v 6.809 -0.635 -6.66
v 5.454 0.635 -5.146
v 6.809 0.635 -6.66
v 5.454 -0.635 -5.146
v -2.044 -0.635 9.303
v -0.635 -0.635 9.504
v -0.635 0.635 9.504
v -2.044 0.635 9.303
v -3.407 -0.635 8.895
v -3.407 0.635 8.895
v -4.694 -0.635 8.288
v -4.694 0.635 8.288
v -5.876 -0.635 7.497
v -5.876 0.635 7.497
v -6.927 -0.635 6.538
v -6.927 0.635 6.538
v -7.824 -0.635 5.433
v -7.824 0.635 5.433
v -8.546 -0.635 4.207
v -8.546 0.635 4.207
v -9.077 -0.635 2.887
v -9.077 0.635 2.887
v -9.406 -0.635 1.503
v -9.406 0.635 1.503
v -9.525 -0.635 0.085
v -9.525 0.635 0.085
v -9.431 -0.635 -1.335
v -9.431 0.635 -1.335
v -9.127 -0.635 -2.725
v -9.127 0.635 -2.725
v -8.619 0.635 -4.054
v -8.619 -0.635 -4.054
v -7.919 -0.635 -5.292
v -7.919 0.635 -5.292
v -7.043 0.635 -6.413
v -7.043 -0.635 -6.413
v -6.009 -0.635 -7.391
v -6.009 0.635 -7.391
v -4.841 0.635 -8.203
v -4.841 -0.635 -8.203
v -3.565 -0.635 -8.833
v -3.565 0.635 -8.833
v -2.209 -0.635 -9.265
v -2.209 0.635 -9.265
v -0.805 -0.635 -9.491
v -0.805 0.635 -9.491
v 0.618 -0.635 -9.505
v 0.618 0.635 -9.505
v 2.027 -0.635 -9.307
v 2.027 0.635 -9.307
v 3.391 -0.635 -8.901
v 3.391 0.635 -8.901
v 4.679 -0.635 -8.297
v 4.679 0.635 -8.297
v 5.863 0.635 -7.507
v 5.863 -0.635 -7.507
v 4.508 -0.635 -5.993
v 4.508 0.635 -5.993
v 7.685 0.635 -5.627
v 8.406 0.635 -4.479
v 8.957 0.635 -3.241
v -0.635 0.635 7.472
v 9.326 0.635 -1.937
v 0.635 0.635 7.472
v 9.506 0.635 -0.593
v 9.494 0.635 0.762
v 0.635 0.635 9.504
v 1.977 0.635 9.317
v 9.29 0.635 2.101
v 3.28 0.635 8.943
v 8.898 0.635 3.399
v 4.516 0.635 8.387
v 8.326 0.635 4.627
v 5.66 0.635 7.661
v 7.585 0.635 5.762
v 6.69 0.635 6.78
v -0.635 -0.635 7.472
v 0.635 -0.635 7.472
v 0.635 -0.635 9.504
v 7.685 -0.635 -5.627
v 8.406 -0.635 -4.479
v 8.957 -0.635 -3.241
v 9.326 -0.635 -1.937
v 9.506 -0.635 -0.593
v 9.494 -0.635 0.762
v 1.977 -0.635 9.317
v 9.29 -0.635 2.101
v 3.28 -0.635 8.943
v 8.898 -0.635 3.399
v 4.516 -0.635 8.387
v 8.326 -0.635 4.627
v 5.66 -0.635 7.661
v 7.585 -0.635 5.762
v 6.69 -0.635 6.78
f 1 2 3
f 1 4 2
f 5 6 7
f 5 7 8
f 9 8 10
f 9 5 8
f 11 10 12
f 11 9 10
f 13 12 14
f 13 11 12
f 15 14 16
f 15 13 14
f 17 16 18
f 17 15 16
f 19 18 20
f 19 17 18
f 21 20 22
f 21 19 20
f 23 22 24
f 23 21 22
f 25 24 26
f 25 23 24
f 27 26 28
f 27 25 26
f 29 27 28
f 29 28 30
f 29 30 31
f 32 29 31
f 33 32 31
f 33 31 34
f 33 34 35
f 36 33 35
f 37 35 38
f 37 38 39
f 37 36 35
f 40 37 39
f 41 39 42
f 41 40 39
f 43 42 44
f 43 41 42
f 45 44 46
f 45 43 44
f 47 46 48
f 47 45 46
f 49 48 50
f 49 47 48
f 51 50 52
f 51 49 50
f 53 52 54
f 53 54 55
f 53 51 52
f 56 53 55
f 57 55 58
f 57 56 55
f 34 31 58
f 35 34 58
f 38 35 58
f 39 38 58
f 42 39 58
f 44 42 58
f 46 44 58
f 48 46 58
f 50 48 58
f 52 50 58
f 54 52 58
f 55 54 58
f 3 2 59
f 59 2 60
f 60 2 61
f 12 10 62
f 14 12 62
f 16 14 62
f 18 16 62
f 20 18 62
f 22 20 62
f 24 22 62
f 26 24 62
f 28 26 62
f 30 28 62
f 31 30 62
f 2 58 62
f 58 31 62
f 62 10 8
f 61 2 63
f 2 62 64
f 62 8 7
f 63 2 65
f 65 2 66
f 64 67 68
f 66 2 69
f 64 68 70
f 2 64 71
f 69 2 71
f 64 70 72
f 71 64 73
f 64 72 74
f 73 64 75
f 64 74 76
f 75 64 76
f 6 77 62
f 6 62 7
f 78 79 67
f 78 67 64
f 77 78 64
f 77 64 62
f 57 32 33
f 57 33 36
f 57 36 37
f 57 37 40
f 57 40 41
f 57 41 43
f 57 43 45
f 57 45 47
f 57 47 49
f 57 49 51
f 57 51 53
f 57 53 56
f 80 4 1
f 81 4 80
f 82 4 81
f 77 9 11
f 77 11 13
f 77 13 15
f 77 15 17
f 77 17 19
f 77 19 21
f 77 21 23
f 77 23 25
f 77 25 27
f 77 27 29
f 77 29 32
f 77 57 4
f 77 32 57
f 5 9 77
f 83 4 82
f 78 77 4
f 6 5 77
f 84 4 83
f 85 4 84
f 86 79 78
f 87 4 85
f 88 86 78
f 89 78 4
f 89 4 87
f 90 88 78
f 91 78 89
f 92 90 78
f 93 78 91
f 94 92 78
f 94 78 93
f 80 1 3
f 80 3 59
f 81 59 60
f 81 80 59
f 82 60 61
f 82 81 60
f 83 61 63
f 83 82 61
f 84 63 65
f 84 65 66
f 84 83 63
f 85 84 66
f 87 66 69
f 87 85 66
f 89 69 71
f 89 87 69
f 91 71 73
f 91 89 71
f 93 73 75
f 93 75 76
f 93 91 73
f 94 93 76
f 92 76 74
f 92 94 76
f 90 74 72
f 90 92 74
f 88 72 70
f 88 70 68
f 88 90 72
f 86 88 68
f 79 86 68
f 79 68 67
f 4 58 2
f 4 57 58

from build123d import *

# Parameters (mm, degrees)
F1_DEPTH = 0.635


with BuildPart() as f1:
    # F0 (on Front) → F1 (new body, symmetric)
    with BuildSketch(Plane.XZ):
        with BuildLine():
            Line((5.454479, -5.145855), (6.809138, -6.660426))
            ThreePointArc((6.809138, -6.660426), (8.898001, 3.398706), (0.635, 9.50381))
            Line((0.635, 9.50381), (0.635, 7.47181))
            Line((0.635, 7.47181), (-0.635, 7.47181))
            Line((-0.635, 7.47181), (-0.635, 9.50381))
            ThreePointArc((-0.635, 9.50381), (-8.898001, -3.398706), (5.862531, -7.507087))
            Line((5.862531, -7.507087), (4.507873, -5.992516))
            Line((4.507873, -5.992516), (5.454479, -5.145855))
        make_face()
    extrude(amount=F1_DEPTH, both=True)


solid = f1.part
